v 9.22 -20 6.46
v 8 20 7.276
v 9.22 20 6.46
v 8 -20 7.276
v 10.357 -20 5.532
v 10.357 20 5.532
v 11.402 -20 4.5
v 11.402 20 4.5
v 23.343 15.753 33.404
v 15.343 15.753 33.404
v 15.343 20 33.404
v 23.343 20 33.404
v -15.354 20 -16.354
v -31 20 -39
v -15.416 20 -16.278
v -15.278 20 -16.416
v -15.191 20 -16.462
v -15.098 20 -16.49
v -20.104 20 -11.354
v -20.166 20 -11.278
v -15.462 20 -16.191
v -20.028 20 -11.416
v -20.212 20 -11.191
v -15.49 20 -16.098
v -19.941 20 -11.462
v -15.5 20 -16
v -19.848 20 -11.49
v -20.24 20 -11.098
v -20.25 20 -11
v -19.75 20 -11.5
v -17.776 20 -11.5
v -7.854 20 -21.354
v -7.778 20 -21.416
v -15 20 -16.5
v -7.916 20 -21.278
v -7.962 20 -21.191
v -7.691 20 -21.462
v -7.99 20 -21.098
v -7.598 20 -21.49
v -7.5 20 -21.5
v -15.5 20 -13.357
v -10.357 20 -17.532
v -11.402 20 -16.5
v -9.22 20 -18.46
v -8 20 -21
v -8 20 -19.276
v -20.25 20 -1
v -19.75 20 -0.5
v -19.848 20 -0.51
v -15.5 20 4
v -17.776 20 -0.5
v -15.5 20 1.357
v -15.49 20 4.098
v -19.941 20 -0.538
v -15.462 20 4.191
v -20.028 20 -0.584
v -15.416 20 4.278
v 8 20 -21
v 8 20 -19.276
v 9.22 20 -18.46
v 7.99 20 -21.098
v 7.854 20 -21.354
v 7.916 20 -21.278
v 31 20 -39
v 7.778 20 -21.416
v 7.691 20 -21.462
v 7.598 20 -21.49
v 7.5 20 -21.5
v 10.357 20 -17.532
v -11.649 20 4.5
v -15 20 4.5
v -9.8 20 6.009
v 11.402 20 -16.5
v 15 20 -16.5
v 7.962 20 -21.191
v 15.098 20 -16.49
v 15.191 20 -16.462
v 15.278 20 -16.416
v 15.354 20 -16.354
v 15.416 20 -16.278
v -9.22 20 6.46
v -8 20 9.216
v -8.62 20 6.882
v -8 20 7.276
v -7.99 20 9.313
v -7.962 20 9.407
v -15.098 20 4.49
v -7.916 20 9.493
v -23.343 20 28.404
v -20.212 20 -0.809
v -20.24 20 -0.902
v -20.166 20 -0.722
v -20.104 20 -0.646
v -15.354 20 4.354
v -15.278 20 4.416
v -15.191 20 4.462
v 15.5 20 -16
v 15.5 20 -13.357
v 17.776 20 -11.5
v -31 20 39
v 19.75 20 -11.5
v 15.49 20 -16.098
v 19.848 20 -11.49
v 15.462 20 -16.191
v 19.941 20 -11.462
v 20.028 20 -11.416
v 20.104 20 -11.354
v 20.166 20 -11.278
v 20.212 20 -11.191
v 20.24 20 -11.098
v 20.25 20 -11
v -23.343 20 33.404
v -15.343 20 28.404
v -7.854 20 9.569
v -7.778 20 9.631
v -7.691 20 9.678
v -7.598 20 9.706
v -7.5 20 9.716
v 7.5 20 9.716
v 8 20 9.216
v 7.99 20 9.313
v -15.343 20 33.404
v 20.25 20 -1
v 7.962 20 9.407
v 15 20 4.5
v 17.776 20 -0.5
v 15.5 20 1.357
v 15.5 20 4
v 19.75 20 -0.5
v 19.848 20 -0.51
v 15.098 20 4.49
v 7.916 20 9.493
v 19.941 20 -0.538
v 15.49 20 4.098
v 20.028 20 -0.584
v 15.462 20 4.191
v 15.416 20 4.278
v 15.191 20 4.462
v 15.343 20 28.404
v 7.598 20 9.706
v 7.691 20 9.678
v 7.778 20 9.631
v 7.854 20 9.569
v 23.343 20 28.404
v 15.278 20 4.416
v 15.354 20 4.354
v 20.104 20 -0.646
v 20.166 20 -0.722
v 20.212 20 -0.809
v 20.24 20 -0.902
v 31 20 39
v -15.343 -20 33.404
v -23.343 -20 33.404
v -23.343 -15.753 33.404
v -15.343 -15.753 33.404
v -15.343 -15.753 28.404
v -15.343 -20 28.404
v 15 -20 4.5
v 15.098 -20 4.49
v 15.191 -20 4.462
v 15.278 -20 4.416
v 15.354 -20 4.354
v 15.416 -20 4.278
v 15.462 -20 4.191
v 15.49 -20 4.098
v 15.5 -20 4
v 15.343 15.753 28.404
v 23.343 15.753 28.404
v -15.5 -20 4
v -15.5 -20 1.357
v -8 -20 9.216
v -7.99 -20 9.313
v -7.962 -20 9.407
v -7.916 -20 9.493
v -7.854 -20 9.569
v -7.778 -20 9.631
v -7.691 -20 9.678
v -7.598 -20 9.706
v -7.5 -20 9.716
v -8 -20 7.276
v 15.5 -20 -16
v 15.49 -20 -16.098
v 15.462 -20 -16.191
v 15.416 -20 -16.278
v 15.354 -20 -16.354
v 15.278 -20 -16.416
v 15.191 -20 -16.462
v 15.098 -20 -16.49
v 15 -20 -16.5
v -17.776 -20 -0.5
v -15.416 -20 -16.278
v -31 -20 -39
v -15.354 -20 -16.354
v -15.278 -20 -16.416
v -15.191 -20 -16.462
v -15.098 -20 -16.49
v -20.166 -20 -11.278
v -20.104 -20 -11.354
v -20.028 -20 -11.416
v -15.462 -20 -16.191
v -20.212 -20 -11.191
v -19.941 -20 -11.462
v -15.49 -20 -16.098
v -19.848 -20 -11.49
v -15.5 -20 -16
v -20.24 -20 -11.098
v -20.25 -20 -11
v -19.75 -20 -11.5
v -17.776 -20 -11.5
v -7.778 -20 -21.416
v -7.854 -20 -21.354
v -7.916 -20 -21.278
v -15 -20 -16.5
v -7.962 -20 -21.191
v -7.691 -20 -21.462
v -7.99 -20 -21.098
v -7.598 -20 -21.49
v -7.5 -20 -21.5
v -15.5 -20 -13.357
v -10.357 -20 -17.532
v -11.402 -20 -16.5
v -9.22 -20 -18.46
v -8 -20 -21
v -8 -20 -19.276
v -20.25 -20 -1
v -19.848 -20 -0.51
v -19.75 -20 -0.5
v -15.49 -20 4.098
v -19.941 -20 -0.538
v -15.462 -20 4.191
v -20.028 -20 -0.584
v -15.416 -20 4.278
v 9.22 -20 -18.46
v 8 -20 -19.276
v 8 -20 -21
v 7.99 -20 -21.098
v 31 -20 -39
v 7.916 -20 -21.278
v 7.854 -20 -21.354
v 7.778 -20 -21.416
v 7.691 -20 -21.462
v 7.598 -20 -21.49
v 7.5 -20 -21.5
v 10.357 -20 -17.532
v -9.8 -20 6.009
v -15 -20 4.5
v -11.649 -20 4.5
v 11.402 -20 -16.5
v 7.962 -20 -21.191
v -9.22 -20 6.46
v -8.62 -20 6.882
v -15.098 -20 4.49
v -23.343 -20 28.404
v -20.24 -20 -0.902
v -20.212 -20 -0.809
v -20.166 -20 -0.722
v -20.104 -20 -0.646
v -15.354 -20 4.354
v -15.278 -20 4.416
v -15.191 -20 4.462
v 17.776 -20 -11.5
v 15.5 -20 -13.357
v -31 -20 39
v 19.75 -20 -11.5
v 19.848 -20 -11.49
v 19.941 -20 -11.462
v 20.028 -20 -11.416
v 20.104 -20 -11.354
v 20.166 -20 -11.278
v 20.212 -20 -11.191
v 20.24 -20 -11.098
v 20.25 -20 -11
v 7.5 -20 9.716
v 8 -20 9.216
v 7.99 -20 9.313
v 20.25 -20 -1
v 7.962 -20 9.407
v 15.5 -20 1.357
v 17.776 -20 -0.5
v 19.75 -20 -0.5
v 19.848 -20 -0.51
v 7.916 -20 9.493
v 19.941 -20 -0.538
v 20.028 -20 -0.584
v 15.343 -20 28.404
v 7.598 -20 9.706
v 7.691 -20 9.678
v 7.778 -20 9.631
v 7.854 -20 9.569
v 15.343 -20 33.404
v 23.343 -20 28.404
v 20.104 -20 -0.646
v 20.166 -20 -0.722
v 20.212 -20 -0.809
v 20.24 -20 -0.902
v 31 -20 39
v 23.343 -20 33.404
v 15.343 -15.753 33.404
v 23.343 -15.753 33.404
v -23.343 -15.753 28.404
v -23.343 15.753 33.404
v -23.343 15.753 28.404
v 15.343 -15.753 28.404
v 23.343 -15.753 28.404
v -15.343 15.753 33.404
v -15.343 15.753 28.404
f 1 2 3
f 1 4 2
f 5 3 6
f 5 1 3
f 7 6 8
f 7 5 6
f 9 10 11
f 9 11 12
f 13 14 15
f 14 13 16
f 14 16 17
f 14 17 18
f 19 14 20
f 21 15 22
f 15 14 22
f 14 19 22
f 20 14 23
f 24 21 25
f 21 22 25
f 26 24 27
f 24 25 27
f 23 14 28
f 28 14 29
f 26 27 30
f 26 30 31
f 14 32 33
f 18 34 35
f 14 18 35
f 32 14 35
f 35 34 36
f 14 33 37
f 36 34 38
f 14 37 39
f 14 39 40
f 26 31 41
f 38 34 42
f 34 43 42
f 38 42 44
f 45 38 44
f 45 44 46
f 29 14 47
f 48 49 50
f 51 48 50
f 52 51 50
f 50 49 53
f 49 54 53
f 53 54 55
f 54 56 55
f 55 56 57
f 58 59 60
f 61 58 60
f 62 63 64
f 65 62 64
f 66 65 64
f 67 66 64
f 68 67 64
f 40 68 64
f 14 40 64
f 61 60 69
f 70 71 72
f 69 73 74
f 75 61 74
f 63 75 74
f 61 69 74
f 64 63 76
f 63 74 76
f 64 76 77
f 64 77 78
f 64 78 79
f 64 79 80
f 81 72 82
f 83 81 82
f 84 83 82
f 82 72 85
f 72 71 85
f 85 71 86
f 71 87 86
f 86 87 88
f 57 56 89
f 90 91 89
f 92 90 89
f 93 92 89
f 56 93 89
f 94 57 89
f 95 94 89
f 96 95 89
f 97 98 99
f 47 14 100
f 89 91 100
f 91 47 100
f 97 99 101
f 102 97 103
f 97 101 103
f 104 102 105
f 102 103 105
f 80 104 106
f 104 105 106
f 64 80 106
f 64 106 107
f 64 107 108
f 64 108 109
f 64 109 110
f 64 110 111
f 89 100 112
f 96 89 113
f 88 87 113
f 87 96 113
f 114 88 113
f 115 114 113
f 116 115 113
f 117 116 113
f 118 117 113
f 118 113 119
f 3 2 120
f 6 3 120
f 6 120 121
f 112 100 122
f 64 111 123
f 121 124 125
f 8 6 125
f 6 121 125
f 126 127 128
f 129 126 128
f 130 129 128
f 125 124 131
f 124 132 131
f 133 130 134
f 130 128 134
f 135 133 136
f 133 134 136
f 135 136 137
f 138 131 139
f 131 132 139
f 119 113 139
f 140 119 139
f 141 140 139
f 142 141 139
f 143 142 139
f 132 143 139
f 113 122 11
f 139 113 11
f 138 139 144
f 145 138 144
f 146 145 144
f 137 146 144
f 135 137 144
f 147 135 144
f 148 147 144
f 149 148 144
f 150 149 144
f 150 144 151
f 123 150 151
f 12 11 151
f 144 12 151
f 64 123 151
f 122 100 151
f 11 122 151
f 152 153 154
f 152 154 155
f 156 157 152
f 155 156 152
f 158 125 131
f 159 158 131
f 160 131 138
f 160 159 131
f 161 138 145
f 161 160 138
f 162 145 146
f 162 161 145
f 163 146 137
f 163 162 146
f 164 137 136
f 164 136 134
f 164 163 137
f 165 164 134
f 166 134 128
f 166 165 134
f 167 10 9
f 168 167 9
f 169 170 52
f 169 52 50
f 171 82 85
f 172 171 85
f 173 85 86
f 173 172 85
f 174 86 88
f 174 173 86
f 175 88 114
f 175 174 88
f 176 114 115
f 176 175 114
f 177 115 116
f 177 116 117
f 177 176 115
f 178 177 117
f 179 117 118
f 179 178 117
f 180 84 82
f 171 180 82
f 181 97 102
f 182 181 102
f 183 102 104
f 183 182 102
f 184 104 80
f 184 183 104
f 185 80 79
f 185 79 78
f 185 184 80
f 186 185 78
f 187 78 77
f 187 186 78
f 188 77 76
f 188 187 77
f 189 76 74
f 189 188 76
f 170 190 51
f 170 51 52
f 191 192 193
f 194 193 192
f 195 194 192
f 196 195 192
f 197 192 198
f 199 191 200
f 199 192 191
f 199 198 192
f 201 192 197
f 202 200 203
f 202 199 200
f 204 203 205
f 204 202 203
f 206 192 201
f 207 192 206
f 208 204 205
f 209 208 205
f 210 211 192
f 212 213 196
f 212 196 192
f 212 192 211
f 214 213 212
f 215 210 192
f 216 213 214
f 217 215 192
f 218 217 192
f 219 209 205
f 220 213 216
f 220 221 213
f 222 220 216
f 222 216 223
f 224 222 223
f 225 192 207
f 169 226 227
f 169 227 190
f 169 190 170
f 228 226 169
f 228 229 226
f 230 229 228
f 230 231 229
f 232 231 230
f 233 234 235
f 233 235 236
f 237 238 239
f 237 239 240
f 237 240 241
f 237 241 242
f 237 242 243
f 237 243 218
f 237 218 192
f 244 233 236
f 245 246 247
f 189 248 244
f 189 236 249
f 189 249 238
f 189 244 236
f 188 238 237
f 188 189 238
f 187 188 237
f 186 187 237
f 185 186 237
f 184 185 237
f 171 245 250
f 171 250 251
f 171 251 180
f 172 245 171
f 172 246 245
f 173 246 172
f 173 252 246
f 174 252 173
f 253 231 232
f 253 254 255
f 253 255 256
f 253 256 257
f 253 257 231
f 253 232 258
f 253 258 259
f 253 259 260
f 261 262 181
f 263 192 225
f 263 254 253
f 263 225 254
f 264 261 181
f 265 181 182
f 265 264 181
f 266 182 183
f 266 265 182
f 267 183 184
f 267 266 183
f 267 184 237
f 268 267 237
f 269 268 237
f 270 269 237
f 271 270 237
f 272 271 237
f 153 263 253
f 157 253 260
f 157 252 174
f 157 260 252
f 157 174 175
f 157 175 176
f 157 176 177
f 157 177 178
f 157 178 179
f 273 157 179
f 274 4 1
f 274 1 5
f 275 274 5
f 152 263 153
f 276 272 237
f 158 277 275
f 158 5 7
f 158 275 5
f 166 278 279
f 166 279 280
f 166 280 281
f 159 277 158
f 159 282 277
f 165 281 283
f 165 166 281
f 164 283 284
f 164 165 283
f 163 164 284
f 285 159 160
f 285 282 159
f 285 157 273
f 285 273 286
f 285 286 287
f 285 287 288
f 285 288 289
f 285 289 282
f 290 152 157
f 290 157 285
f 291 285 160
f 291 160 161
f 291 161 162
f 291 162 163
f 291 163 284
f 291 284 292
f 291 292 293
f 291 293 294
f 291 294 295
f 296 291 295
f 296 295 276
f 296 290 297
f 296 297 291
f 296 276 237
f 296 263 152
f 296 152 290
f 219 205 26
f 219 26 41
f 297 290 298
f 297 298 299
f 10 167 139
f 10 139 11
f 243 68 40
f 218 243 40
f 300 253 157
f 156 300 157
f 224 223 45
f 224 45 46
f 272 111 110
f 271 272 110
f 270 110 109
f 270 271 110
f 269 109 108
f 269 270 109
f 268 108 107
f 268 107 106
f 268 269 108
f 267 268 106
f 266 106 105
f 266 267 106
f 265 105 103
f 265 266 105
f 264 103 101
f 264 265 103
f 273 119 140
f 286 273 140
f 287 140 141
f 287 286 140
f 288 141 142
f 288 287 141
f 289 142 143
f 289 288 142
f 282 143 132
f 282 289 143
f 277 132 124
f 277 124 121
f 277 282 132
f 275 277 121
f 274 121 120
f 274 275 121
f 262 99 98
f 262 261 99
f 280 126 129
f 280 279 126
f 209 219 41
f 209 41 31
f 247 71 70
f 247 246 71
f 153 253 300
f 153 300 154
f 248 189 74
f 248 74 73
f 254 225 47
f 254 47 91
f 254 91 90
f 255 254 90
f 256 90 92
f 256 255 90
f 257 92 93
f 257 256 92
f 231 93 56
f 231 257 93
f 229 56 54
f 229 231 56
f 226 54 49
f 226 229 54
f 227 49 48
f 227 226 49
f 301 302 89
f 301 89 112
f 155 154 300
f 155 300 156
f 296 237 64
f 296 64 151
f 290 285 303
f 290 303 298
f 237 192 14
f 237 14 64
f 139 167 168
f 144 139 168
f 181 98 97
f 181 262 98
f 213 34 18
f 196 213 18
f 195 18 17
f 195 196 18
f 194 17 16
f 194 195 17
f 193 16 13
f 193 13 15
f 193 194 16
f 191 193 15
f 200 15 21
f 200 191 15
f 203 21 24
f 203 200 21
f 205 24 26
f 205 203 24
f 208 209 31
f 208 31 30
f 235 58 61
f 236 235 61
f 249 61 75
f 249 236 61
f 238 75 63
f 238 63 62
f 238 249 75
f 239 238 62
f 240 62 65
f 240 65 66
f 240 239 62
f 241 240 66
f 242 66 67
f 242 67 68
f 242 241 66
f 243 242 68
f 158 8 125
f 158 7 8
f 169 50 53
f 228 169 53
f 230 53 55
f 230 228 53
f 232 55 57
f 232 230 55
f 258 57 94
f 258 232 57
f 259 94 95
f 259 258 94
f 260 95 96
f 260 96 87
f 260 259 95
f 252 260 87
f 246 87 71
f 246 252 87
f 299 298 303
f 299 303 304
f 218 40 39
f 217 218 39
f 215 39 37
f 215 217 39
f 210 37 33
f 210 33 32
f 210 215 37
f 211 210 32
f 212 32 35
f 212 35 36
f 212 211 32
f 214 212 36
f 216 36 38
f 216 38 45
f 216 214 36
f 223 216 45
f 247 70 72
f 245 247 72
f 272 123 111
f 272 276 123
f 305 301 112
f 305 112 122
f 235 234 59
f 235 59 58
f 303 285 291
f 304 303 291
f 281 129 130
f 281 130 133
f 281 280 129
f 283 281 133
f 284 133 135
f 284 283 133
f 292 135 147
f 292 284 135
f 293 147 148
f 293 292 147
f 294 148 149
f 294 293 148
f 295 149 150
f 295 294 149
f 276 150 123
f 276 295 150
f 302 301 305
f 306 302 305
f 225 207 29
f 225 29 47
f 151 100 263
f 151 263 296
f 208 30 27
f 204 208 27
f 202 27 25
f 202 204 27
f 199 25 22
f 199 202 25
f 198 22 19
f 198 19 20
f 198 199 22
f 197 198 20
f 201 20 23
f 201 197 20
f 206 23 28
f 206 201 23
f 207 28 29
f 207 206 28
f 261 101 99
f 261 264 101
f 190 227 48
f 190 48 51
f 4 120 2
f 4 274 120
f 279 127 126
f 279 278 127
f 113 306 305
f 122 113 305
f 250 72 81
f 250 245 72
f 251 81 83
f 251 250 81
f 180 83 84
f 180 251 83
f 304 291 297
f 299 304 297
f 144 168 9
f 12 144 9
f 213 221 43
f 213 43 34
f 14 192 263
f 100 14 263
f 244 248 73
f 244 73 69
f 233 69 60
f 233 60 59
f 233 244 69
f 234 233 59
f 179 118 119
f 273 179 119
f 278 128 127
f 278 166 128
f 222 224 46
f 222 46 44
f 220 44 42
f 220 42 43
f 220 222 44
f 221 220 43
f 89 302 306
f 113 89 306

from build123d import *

# Parameters (mm, degrees)
F0_W     = 62
F0_H     = 78
F0_W_2   = 8
F0_H_2   = 5
F1_DEPTH = 20
F2_W     = 54.3611720204
F2_H     = 31.5054729581
F3_DEPTH = 15


with BuildPart() as f1:
    # F0 (on Front) → F1 (new body, symmetric)
    with BuildSketch(Plane.XZ):
        Rectangle(F0_W, F0_H)
        with BuildLine():
            ThreePointArc((15.5, -16), (15.3535533906, -16.3535533906), (15, -16.5))
            Line((15, -16.5), (11.401754251, -16.5))
            ThreePointArc((11.401754251, -16.5), (9.7996656706, -18.0090196413), (8, -19.2759180474))
            Line((8, -19.2759180474), (8, -21))
            ThreePointArc((8, -21), (7.8535533906, -21.3535533906), (7.5, -21.5))
            Line((7.5, -21.5), (-7.5, -21.5))
            ThreePointArc((-7.5, -21.5), (-7.8535533906, -21.3535533906), (-8, -21))
            Line((-8, -21), (-8, -19.2759180474))
            ThreePointArc((-8, -19.2759180474), (-9.7996656706, -18.0090196413), (-11.401754251, -16.5))
            Line((-11.401754251, -16.5), (-15, -16.5))
            ThreePointArc((-15, -16.5), (-15.3535533906, -16.3535533906), (-15.5, -16))
            Line((-15.5, -16), (-15.5, -13.3574017484))
            Line((-15.5, -13.3574017484), (-17.7761566393, -11.5))
            Line((-17.7761566393, -11.5), (-19.75, -11.5))
            ThreePointArc((-19.75, -11.5), (-20.1035533906, -11.3535533906), (-20.25, -11))
            Line((-20.25, -11), (-20.25, -1))
            ThreePointArc((-20.25, -1), (-20.1035533906, -0.6464466094), (-19.75, -0.5))
            Line((-19.75, -0.5), (-17.7761566393, -0.5))
            Line((-17.7761566393, -0.5), (-15.5, 1.3574017484))
            Line((-15.5, 1.3574017484), (-15.5, 4))
            ThreePointArc((-15.5, 4), (-15.3535533906, 4.3535533906), (-15, 4.5))
            Line((-15, 4.5), (-11.6488967689, 4.5))
            Line((-11.6488967689, 4.5), (-9.7996656706, 6.0090196413))
            ThreePointArc((-9.7996656706, 6.0090196413), (-8.9223473587, 6.6744513732), (-8, 7.2759180474))
            Line((-8, 7.2759180474), (-8, 9.2156053036))
            ThreePointArc((-8, 9.2156053036), (-7.8535533906, 9.5691586942), (-7.5, 9.7156053036))
            Line((-7.5, 9.7156053036), (7.5, 9.7156053036))
            ThreePointArc((7.5, 9.7156053036), (7.8535533906, 9.5691586942), (8, 9.2156053036))
            Line((8, 9.2156053036), (8, 7.2759180474))
            ThreePointArc((8, 7.2759180474), (9.7996656706, 6.0090196413), (11.401754251, 4.5))
            Line((11.401754251, 4.5), (15, 4.5))
            ThreePointArc((15, 4.5), (15.3535533906, 4.3535533906), (15.5, 4))
            Line((15.5, 4), (15.5, 1.3574017484))
            Line((15.5, 1.3574017484), (17.7761566393, -0.5))
            Line((17.7761566393, -0.5), (19.75, -0.5))
            ThreePointArc((19.75, -0.5), (20.1035533906, -0.6464466094), (20.25, -1))
            Line((20.25, -1), (20.25, -11))
            ThreePointArc((20.25, -11), (20.1035533906, -11.3535533906), (19.75, -11.5))
            Line((19.75, -11.5), (17.7761566393, -11.5))
            Line((17.7761566393, -11.5), (15.5, -13.3574017484))
            Line((15.5, -13.3574017484), (15.5, -16))
        make_face(mode=Mode.SUBTRACT)
        with Locations((-19.3427710384, 30.9041780978)):
            Rectangle(F0_W_2, F0_H_2, mode=Mode.SUBTRACT)
        with Locations((19.3427710384, 30.9041780978)):
            Rectangle(F0_W_2, F0_H_2, mode=Mode.SUBTRACT)
    extrude(amount=F1_DEPTH, both=True)

    # F2 (on face) → F3 (join)
    with BuildSketch(Plane.XY.offset(39)):
        Rectangle(F2_W, F2_H)
    extrude(amount=-F3_DEPTH)


solid = f1.part
